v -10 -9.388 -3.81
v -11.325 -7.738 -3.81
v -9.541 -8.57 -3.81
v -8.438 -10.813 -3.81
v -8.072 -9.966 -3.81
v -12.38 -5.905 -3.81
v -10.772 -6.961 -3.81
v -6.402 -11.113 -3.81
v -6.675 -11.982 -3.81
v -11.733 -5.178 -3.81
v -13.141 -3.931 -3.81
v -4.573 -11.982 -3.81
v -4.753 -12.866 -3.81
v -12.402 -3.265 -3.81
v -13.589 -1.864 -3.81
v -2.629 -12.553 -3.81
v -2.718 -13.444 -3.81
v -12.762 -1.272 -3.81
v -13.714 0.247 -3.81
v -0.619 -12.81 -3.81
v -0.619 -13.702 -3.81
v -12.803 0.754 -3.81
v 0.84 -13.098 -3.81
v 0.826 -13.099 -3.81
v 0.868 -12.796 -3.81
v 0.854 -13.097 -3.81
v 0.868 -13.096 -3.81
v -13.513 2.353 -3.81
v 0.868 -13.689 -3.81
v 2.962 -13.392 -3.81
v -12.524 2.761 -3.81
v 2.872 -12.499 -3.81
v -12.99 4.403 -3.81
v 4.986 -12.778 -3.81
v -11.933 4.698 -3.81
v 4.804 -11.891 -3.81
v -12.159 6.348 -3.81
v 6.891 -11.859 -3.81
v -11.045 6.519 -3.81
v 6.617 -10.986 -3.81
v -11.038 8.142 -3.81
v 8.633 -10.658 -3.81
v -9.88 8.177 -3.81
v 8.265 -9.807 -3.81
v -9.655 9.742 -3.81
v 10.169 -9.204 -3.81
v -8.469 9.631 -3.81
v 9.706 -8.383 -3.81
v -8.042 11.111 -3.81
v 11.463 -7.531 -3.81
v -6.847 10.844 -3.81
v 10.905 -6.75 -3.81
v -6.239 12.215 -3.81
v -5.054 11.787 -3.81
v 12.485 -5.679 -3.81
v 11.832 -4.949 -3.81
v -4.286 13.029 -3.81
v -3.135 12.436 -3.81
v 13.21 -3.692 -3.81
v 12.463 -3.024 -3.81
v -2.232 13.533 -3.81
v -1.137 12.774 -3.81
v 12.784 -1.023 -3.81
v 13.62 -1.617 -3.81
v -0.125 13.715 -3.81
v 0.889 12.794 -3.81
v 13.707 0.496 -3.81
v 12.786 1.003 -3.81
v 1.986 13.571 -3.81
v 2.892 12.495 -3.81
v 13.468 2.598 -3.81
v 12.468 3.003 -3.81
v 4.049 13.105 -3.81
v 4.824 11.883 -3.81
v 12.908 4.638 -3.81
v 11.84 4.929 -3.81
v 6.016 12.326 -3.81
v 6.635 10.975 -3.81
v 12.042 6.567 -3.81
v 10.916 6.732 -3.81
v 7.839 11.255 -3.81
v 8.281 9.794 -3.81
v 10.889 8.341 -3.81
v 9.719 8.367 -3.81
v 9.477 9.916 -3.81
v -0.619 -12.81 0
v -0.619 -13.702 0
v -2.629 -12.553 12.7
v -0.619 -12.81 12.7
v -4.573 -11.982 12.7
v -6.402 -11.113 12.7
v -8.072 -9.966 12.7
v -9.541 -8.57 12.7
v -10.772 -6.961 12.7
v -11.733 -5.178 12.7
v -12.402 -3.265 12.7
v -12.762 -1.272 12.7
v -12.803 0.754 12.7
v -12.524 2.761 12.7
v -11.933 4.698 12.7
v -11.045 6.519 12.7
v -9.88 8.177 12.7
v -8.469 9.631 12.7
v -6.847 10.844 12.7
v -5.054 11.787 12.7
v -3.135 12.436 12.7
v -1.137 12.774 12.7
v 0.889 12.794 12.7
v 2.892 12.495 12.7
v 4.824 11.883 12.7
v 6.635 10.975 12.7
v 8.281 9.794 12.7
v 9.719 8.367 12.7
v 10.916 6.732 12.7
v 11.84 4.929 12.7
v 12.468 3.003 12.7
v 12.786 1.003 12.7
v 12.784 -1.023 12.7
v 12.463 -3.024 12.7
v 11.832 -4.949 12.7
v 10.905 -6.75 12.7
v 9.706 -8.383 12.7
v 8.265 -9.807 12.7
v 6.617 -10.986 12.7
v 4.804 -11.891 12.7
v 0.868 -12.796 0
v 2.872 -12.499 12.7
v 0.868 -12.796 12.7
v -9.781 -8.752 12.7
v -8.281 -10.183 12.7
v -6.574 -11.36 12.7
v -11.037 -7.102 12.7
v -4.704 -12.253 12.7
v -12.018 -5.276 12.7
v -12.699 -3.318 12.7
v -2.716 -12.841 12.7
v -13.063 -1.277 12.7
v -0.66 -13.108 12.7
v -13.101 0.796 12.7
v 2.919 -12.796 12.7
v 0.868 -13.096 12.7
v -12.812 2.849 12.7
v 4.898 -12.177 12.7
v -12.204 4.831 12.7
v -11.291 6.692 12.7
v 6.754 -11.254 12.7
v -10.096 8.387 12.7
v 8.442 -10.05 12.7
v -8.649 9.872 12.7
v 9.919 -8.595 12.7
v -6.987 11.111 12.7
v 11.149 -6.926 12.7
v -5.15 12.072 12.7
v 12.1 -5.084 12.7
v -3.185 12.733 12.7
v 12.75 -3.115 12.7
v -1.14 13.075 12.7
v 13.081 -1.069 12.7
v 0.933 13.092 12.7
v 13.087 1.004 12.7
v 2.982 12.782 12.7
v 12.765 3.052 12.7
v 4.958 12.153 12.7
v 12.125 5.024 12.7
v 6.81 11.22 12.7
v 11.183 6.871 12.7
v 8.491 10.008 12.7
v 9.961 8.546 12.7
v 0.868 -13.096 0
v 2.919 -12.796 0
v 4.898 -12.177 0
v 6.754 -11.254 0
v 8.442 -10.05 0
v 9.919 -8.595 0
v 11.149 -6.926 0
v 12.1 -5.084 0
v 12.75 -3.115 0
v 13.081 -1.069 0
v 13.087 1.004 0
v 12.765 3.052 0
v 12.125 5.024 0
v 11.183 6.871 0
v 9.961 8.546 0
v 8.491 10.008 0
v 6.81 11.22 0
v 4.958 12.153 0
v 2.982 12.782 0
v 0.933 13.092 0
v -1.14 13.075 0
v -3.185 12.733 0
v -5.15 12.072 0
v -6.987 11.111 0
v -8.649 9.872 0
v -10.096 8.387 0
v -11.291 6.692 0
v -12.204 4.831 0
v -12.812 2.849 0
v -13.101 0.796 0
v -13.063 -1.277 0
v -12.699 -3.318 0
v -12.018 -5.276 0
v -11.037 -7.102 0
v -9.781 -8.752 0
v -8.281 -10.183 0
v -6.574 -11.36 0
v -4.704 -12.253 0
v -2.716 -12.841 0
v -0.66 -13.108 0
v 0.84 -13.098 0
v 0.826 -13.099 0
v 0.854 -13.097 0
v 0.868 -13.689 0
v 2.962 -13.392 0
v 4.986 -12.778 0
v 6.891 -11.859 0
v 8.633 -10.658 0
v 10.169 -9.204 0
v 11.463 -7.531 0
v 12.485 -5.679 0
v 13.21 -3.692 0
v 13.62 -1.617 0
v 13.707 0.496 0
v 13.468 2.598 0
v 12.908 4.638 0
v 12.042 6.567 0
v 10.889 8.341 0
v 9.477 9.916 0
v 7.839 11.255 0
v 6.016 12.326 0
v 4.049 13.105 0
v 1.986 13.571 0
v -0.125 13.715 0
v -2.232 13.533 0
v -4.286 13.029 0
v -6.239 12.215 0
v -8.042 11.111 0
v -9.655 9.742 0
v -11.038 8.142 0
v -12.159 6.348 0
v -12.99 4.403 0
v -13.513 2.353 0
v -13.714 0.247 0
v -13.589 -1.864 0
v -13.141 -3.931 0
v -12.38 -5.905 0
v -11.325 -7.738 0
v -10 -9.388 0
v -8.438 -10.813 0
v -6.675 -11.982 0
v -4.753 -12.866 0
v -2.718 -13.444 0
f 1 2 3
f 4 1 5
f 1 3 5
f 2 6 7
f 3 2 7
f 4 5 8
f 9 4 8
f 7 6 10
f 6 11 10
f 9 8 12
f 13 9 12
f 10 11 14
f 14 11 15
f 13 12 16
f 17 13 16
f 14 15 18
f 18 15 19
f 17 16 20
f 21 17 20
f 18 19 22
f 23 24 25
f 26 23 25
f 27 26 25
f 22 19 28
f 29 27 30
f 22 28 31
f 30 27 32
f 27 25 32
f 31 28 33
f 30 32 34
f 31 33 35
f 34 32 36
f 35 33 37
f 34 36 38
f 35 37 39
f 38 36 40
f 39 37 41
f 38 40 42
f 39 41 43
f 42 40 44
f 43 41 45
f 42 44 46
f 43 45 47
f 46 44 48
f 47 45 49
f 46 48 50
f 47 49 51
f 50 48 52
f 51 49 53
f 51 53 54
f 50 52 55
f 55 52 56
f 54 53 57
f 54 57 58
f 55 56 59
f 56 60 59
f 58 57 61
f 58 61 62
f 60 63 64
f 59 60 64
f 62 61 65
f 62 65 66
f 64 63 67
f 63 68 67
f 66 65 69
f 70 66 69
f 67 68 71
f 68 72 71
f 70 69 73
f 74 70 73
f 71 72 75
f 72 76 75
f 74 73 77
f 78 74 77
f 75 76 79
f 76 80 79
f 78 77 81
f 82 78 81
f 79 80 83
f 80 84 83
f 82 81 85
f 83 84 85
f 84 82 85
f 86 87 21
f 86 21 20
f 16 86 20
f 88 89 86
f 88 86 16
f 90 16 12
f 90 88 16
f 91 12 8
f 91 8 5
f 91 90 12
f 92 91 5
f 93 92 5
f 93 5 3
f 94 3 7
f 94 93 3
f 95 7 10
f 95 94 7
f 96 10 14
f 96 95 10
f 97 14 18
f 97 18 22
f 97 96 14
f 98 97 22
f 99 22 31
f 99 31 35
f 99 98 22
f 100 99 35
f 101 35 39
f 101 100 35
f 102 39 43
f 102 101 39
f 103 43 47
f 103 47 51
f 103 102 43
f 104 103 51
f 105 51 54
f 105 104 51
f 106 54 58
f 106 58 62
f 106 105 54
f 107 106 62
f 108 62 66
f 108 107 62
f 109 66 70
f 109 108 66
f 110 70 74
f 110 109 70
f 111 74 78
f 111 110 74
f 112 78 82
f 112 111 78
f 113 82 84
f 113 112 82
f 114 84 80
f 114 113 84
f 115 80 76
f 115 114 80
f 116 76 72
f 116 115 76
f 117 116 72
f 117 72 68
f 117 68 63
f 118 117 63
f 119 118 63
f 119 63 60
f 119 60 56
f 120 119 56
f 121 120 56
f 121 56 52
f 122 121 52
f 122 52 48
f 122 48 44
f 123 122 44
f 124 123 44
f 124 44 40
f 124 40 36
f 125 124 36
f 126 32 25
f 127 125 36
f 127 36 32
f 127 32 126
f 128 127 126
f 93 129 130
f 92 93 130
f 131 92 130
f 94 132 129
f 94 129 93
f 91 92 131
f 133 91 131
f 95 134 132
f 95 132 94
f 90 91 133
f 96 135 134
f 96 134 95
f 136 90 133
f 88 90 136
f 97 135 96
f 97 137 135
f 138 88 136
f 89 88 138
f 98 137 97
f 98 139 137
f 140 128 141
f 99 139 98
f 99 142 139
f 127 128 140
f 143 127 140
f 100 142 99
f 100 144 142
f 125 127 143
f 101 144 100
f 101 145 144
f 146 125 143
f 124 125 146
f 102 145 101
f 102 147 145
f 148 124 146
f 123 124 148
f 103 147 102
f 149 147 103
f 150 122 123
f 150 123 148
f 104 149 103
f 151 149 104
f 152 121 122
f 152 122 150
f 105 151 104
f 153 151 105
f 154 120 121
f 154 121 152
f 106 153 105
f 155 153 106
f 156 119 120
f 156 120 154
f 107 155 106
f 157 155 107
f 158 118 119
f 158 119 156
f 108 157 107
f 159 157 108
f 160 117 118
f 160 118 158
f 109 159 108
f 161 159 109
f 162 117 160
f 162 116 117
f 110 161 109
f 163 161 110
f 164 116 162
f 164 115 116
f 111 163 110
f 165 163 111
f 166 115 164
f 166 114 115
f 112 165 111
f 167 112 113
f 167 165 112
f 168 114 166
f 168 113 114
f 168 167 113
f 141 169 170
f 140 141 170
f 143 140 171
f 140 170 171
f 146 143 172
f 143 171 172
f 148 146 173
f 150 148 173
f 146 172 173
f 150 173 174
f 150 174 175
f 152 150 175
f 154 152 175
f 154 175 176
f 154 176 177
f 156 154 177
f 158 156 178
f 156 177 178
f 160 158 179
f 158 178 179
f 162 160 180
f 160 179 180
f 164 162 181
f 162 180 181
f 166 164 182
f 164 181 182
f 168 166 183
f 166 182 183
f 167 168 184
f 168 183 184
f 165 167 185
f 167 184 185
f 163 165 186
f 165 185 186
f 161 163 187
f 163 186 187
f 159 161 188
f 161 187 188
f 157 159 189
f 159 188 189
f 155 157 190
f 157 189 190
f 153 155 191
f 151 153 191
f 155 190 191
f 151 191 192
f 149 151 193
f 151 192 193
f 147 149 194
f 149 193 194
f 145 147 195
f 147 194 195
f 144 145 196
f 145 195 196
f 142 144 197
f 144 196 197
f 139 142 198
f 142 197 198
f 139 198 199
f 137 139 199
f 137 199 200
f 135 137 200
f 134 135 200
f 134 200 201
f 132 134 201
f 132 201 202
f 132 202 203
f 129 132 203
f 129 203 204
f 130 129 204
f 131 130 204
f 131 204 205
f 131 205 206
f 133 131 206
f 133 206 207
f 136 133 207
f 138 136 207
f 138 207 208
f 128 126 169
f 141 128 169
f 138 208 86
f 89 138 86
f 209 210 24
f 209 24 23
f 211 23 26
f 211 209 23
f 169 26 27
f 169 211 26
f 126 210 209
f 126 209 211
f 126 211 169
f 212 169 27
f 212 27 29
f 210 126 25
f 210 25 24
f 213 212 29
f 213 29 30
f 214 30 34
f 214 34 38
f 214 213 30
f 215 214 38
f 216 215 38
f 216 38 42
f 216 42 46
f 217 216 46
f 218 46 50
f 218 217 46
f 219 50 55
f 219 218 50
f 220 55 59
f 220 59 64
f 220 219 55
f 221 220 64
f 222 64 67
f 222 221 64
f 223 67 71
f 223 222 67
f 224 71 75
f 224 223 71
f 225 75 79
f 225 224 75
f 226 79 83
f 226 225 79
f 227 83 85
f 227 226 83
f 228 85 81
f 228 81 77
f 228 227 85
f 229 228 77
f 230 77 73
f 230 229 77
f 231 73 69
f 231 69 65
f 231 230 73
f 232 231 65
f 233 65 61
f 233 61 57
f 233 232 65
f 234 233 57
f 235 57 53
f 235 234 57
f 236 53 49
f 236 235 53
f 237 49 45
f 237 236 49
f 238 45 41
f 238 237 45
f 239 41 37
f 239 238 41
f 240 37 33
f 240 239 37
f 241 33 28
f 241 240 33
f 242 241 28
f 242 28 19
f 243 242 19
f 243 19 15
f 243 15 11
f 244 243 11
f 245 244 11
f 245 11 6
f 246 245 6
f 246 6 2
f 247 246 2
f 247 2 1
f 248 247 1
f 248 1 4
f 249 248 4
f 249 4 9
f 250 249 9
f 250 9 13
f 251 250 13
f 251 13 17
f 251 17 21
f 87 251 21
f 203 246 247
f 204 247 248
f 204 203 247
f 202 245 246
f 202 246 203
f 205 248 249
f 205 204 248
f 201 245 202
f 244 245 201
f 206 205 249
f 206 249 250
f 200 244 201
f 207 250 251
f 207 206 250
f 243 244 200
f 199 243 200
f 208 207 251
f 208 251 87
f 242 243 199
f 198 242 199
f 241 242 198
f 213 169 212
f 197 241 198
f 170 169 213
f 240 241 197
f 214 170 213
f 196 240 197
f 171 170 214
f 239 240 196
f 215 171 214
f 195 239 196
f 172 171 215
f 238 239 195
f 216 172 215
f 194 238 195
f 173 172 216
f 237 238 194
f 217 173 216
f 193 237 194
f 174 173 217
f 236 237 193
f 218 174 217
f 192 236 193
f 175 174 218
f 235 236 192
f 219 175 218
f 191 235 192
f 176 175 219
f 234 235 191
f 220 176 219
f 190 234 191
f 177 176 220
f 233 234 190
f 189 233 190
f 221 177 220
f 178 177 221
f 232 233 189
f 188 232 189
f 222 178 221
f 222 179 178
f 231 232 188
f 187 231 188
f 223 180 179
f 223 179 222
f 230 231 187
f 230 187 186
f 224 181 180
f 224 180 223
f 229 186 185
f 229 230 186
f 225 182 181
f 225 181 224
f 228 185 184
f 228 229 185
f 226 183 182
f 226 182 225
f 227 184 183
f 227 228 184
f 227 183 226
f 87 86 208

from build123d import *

# Parameters (mm, degrees)
F1_DEPTH = 12.7
F2_DEPTH = 3.81


with BuildPart() as f1:
    # F0 (on Top) → F1 (new body)
    with BuildSketch(Plane.XY):
        with BuildLine():
            ThreePointArc((-0.619034, -12.810052), (-0.124602, 12.824395), (0.867818, -12.795605))
            Line((0.867818, -12.795605), (0.867818, -13.096279))
            ThreePointArc((0.867818, -13.096279), (-0.104246, 13.124586), (-0.659679, -13.108411))
            Line((-0.659679, -13.108411), (-0.619034, -12.810052))
        make_face()
    extrude(amount=F1_DEPTH)

    # F0 (on Top) → F2 (join)
    with BuildSketch(Plane.XY):
        with BuildLine():
            Line((0.867818, -13.096279), (0.867818, -12.795605))
            Line((0.867818, -12.795605), (0.826493, -13.098952))
            ThreePointArc((0.826493, -13.098952), (0.847157, -13.097631), (0.867818, -13.096279))
        make_face()
        with BuildLine():
            ThreePointArc((-0.619034, -12.810052), (-0.124602, 12.824395), (0.867818, -12.795605))
            Line((0.867818, -12.795605), (0.867818, -13.096279))
            ThreePointArc((0.867818, -13.096279), (-0.104246, 13.124586), (-0.659679, -13.108411))
            Line((-0.659679, -13.108411), (-0.619034, -12.810052))
        make_face()
        with BuildLine():
            Line((-0.619034, -13.702024), (-0.619034, -12.810052))
            Line((-0.619034, -12.810052), (-0.659679, -13.108411))
            ThreePointArc((-0.659679, -13.108411), (-0.104246, 13.124586), (0.867818, -13.096279))
            Line((0.867818, -13.096279), (0.867818, -13.688519))
            ThreePointArc((0.867818, -13.688519), (-0.124575, 13.715434), (-0.619034, -13.702024))
        make_face()
    extrude(amount=-F2_DEPTH)


solid = f1.part
